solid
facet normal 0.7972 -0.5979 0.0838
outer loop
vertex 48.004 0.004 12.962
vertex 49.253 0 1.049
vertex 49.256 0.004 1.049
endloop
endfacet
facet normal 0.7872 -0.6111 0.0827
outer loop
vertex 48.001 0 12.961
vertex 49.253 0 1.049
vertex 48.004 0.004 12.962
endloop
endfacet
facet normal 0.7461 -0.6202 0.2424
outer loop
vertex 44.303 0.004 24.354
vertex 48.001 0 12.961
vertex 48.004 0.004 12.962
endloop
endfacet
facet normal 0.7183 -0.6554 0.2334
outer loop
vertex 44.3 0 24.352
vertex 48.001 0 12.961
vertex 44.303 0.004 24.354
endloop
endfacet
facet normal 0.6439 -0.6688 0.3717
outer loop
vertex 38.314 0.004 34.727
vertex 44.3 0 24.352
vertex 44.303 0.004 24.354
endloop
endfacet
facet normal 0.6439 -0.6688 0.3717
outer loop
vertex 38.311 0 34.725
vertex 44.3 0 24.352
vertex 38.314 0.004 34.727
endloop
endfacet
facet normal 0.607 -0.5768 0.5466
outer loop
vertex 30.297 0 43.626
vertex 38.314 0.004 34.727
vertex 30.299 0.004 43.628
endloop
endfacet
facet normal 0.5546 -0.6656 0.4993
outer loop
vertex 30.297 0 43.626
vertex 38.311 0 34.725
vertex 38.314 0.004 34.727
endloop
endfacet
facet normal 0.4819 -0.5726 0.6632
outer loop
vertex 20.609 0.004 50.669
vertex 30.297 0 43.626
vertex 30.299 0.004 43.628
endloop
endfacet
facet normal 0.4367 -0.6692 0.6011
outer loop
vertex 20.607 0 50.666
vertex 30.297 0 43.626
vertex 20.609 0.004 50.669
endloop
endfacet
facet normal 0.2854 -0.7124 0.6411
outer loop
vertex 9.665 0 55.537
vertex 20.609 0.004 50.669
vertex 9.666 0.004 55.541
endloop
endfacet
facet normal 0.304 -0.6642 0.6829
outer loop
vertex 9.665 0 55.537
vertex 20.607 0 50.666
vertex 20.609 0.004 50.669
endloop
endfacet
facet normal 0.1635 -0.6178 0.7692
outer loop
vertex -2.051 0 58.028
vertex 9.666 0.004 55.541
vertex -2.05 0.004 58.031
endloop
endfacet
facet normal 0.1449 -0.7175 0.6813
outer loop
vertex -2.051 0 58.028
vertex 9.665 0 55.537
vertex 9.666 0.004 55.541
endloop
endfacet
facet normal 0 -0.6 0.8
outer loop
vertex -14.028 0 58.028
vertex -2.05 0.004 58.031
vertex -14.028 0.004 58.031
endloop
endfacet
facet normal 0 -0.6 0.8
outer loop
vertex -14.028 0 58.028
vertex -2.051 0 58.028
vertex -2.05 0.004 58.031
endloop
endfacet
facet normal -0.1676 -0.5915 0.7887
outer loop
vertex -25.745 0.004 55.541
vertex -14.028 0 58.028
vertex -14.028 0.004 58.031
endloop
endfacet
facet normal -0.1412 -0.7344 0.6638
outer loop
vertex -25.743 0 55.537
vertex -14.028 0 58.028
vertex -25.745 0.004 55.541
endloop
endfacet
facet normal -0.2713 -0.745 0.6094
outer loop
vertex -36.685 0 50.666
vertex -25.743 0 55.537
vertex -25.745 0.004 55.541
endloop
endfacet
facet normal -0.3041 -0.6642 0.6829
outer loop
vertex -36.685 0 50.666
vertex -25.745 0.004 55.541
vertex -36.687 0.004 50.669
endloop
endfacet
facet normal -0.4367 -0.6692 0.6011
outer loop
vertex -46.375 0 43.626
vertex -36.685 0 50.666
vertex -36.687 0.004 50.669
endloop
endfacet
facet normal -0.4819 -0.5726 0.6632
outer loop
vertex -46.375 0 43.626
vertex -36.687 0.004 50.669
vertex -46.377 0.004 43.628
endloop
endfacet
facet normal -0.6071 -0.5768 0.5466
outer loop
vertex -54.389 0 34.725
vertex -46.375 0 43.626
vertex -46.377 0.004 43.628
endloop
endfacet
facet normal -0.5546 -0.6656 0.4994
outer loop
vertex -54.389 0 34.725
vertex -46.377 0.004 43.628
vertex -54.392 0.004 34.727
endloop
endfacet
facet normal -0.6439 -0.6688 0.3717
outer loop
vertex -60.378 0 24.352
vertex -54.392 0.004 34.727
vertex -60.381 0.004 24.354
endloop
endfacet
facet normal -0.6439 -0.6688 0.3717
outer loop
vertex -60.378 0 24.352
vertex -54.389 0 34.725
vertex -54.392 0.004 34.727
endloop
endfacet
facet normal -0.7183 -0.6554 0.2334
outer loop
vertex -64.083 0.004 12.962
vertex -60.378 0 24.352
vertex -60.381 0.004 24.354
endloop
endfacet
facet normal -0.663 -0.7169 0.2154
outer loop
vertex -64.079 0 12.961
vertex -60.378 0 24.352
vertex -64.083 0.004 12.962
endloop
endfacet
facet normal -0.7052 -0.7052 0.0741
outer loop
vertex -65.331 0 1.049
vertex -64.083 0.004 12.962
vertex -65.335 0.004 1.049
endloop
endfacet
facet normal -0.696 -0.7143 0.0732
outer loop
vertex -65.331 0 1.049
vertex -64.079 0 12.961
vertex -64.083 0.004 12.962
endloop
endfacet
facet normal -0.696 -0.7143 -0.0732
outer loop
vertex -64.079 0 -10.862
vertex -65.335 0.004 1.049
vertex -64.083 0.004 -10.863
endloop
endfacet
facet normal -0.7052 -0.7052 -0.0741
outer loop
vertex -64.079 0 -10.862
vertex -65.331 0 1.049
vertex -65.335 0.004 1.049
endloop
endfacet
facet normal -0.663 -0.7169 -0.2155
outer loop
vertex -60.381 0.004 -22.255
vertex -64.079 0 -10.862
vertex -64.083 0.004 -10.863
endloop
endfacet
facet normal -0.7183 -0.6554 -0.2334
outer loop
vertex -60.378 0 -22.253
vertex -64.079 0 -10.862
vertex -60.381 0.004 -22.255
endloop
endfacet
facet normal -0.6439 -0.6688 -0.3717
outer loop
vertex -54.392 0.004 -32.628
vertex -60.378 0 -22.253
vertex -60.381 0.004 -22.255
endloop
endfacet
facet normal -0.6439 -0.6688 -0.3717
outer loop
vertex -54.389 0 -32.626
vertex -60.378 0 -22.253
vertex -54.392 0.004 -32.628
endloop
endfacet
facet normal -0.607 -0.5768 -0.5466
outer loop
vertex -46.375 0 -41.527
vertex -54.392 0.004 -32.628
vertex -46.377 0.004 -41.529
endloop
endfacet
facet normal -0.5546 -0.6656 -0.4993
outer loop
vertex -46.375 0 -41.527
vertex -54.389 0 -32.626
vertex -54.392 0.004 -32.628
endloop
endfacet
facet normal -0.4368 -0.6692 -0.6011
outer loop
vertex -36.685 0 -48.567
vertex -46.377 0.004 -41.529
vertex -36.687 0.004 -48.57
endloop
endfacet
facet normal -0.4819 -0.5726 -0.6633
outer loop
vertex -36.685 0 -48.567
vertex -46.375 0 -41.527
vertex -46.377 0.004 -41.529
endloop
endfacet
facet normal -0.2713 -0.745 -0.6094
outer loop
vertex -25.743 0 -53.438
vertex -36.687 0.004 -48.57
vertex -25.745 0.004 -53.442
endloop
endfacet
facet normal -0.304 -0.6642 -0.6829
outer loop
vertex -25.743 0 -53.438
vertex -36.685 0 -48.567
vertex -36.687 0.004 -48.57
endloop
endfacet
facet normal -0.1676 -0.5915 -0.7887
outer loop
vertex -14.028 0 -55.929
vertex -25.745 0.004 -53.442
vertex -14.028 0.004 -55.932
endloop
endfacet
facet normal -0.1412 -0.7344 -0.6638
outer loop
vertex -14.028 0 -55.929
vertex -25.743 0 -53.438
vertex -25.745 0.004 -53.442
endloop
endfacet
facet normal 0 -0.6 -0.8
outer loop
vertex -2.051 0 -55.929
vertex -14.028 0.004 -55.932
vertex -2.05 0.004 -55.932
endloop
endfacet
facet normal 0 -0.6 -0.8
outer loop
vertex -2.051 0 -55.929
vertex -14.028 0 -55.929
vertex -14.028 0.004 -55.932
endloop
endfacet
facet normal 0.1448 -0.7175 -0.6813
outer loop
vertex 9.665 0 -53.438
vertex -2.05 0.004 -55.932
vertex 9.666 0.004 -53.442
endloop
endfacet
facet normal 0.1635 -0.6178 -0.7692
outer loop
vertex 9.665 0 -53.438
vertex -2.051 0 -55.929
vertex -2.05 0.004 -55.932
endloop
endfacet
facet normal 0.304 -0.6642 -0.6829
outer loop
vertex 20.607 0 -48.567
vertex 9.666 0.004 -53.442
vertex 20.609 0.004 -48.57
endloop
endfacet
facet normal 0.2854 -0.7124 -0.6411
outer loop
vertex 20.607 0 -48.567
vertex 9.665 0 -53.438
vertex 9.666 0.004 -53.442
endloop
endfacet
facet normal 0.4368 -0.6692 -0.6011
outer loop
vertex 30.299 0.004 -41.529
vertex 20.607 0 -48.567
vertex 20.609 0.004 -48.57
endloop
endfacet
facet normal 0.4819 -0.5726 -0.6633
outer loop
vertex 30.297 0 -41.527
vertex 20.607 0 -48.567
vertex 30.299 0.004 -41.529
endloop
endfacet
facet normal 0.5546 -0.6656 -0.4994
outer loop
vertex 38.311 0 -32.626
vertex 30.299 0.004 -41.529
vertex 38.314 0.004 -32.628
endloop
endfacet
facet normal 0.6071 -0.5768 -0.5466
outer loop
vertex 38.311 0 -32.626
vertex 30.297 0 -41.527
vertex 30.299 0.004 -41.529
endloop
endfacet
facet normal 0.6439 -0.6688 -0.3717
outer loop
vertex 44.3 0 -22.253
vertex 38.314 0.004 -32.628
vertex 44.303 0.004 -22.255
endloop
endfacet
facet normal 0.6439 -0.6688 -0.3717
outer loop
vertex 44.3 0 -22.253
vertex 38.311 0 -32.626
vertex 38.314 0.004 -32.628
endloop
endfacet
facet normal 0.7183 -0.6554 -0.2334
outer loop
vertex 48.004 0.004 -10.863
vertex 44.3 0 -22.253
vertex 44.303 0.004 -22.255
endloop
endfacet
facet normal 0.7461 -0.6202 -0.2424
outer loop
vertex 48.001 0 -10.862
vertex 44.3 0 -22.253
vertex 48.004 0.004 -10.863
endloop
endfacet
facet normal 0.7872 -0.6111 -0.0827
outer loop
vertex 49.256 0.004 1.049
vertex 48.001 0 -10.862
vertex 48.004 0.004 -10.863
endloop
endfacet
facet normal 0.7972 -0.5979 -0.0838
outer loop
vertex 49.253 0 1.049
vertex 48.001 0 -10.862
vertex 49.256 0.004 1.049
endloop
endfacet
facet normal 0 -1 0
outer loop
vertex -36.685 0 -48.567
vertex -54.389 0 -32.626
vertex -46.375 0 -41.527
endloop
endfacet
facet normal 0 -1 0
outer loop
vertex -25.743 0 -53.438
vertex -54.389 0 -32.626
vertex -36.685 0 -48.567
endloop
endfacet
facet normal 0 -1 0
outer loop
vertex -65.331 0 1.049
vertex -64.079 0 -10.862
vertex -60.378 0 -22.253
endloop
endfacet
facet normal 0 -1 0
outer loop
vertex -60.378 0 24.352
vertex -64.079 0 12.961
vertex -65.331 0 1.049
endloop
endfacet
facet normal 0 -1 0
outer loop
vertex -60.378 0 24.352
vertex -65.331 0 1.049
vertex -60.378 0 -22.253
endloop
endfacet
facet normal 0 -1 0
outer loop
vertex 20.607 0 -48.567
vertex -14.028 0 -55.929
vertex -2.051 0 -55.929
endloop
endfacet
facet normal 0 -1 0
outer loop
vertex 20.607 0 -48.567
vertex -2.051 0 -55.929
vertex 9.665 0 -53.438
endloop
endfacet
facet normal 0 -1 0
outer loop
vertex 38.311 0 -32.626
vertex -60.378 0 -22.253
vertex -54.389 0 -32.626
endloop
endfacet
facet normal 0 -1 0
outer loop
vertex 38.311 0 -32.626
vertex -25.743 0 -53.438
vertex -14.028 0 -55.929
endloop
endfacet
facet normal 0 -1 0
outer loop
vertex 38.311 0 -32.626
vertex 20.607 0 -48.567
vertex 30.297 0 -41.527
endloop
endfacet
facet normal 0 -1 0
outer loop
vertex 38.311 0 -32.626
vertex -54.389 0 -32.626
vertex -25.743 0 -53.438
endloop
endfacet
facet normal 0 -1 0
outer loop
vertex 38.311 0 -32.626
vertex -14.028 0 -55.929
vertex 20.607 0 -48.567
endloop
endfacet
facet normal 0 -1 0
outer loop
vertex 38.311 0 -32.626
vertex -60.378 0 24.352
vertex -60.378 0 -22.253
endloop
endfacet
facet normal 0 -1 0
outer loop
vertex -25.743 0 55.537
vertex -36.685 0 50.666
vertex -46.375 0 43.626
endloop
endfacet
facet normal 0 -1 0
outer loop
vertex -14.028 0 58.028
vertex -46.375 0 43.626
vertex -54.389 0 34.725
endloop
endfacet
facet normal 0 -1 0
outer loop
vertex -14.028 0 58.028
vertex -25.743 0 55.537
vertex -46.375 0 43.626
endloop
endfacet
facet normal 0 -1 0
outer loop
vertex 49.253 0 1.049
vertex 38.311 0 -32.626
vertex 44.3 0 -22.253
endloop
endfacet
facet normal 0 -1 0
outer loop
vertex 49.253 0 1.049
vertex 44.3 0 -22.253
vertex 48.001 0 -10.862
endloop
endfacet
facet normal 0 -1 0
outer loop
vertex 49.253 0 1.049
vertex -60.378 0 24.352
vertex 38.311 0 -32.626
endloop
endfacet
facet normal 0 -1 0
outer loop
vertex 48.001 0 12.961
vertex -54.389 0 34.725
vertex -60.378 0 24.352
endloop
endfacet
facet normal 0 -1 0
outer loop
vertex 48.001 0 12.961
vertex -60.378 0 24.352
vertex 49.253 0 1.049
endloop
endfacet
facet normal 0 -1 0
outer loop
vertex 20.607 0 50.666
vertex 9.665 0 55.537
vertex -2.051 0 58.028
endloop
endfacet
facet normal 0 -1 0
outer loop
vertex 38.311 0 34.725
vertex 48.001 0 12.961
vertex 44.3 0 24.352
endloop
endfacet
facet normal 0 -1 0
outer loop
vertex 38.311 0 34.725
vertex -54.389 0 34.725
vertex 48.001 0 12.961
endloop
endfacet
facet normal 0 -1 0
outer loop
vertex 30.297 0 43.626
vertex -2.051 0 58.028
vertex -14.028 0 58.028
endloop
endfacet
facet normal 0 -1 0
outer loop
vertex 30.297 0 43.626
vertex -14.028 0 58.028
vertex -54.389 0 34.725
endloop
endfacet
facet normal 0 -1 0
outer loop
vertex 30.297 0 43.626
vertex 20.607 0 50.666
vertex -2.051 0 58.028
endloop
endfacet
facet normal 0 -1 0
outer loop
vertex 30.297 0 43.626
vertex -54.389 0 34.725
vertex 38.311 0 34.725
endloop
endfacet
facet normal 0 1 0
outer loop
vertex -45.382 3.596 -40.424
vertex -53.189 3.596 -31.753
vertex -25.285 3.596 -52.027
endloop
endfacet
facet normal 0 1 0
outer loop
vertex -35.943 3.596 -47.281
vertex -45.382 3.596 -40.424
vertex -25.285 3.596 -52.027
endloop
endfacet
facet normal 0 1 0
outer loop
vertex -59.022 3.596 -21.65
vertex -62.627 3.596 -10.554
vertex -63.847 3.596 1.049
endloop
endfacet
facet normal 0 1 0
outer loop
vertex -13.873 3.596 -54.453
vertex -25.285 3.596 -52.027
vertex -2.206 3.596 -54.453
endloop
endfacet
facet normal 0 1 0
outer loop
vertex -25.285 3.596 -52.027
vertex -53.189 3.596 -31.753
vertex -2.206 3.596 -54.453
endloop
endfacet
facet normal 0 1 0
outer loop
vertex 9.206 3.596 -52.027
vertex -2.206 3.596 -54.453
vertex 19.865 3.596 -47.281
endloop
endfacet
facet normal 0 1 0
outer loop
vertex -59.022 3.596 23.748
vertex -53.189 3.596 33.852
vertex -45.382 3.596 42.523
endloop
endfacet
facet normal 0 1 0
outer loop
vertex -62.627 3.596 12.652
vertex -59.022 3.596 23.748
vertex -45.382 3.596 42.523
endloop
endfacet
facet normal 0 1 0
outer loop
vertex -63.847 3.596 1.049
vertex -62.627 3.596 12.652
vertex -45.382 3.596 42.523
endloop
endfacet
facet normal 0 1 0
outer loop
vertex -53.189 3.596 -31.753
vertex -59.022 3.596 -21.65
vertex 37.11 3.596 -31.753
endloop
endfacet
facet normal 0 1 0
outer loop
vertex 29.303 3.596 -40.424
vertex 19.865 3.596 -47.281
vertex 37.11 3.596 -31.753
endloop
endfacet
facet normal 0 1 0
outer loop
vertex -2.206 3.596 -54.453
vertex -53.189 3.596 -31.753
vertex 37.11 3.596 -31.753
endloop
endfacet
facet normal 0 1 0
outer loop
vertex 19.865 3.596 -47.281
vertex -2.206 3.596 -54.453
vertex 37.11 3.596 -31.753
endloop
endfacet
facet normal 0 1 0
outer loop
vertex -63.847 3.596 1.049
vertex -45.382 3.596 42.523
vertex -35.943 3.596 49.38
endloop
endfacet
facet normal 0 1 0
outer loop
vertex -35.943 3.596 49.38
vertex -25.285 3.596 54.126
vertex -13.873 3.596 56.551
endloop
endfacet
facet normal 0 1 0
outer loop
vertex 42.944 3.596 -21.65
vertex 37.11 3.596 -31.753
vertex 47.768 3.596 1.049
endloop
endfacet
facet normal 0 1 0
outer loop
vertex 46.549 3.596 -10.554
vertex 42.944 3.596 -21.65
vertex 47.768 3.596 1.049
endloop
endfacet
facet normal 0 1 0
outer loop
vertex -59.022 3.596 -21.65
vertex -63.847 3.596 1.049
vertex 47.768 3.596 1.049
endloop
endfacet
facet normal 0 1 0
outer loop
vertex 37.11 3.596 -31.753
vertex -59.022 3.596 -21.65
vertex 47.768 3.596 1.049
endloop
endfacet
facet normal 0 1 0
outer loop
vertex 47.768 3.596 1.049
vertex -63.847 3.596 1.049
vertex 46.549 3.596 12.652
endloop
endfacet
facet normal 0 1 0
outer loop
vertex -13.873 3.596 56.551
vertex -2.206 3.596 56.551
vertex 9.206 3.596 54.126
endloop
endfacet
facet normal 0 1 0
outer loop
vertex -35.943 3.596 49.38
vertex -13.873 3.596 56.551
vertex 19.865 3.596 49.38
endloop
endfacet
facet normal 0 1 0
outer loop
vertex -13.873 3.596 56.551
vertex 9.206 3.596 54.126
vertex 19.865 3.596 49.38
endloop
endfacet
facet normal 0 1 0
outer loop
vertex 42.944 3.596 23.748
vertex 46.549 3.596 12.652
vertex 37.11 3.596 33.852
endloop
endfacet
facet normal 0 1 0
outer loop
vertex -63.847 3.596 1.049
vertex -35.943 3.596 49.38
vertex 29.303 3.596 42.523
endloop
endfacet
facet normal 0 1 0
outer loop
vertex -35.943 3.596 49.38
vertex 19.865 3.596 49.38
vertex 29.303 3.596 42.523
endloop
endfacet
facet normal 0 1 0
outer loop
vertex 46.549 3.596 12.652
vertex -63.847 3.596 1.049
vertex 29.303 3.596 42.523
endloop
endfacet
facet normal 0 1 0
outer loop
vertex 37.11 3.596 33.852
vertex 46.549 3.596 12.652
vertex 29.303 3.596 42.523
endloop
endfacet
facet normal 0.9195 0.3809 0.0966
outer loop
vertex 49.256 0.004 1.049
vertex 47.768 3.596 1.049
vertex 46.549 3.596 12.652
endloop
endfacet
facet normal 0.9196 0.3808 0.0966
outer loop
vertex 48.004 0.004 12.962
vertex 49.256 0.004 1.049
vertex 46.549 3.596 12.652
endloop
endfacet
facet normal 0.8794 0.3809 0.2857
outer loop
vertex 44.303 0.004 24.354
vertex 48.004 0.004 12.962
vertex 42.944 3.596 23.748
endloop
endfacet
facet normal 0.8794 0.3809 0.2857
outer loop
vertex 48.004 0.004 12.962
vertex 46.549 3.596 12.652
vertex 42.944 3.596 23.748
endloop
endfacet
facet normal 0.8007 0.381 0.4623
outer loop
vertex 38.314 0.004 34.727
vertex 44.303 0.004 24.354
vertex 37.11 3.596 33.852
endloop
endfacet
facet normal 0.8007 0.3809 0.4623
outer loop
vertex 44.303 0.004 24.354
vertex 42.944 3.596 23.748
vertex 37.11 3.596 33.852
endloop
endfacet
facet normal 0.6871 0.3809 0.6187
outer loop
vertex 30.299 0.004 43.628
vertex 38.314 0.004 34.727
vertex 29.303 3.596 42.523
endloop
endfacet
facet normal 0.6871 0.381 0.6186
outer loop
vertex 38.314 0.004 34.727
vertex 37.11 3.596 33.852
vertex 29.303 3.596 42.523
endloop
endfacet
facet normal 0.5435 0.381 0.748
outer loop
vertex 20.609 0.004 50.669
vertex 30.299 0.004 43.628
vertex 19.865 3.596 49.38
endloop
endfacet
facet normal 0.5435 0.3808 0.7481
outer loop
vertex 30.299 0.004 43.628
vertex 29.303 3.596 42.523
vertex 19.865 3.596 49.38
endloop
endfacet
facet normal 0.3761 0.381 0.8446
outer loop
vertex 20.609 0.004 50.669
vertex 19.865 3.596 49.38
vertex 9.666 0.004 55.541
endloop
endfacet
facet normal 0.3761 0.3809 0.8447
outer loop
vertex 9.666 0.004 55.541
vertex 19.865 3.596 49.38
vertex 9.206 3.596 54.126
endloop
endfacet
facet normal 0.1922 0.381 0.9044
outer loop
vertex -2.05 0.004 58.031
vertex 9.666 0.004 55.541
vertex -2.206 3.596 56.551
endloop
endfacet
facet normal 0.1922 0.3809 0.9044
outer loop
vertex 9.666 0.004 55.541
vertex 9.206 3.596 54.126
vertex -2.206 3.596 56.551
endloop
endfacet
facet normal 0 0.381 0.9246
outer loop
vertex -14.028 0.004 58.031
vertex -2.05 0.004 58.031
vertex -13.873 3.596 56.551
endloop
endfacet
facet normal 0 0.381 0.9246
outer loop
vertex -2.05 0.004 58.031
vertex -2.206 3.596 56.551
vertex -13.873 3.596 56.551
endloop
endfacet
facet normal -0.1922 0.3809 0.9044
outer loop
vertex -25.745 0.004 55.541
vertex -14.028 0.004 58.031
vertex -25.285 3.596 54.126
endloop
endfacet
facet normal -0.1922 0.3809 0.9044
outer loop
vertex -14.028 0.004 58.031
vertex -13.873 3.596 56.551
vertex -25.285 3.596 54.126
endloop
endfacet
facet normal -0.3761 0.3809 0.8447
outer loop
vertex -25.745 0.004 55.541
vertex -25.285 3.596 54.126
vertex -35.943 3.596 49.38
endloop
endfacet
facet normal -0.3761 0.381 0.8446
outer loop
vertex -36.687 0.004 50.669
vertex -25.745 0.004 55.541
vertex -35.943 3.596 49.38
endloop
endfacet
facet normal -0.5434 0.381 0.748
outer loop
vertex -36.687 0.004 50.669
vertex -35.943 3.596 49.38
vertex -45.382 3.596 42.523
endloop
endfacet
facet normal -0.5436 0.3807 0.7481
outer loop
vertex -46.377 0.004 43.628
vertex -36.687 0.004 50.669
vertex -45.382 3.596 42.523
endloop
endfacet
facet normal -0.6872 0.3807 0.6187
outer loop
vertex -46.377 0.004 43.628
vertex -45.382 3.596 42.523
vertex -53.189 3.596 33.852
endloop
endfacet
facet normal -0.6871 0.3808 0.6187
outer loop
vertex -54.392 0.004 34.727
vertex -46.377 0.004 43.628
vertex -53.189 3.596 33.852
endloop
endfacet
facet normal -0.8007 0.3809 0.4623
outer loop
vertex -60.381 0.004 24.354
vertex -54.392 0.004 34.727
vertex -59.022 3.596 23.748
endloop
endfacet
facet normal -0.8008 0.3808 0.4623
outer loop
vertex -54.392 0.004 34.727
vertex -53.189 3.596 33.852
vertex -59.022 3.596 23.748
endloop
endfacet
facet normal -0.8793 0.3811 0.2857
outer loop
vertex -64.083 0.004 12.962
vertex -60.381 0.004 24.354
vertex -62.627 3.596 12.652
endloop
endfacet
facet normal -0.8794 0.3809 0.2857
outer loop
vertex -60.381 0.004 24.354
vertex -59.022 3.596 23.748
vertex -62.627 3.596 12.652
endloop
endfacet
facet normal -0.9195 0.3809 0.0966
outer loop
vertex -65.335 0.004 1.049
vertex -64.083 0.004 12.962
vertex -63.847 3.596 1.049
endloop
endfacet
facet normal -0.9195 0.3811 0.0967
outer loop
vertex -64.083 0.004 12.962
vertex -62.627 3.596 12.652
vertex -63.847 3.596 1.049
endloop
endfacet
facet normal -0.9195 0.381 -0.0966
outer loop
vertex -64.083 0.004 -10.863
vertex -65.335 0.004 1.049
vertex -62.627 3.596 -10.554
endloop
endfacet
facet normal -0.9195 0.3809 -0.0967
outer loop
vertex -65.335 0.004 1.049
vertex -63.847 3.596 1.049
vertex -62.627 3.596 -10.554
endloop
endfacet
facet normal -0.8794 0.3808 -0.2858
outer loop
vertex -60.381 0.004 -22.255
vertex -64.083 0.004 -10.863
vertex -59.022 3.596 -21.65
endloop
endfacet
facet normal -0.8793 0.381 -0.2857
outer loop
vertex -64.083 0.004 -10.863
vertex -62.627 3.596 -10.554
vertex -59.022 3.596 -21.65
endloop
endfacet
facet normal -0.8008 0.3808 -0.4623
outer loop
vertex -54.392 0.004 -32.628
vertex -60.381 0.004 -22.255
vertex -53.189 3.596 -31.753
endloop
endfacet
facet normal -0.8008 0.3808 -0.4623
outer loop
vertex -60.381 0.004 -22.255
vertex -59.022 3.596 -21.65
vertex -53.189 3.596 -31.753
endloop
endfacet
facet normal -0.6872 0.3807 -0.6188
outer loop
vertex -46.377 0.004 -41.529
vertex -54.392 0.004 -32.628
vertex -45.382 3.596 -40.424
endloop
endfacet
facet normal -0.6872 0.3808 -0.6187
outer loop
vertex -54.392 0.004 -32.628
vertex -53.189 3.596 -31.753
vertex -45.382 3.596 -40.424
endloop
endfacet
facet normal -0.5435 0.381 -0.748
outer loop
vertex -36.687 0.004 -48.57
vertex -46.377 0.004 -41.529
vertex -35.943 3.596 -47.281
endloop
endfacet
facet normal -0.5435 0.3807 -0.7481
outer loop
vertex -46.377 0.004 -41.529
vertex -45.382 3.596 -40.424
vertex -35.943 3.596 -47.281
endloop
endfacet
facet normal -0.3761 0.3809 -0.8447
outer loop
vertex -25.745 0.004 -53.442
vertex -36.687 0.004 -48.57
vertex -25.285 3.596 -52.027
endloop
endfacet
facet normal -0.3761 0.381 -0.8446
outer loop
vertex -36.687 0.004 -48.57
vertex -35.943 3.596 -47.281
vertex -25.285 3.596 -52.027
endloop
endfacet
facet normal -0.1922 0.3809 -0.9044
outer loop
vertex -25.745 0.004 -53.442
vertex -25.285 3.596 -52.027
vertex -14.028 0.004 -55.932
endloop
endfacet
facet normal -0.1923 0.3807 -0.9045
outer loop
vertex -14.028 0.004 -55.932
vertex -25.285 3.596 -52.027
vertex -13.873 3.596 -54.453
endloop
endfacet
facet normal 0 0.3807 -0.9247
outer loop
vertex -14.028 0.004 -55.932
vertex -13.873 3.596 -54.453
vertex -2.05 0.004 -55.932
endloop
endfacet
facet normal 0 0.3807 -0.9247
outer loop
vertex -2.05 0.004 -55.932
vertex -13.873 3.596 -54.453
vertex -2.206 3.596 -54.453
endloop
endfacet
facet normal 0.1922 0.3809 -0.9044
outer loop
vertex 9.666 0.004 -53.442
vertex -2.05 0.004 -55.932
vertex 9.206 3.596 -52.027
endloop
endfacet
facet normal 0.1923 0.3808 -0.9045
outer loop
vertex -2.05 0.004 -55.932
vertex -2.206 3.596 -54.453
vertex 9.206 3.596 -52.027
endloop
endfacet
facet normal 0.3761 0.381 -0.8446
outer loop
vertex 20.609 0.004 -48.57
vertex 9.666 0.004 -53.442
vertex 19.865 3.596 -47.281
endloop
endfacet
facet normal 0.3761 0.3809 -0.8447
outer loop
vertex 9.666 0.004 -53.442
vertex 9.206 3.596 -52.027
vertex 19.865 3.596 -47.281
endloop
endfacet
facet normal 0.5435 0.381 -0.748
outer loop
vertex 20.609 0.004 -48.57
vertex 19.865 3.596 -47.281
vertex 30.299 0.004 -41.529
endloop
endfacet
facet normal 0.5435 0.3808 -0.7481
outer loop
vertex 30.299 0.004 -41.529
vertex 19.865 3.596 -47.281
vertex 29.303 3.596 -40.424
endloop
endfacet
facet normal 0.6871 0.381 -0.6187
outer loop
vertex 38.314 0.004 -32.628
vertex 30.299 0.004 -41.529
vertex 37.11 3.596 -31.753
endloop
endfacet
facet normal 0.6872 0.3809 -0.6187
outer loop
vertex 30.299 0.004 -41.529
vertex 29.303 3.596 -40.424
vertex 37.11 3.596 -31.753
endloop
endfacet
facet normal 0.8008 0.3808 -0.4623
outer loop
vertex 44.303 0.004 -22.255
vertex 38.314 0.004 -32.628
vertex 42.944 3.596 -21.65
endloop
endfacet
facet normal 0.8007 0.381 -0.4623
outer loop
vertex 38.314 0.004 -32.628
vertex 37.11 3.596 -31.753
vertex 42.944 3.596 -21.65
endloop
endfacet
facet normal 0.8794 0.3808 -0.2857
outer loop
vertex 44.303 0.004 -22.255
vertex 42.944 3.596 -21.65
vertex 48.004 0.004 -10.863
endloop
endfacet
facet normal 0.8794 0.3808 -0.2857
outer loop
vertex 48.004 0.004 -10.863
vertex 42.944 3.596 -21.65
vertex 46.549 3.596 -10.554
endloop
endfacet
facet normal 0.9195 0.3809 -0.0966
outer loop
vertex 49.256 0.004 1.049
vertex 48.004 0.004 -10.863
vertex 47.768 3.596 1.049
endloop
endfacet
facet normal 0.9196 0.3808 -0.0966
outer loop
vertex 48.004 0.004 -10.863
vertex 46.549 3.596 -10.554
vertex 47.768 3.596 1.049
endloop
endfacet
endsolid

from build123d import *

# Parameters (mm, degrees)
F0_R     = 62.3719654877
F1_DEPTH = 3.5956986248
F3_SIZE  = 5.08


# Not quite as in the source:
# - a fillet or chamfer that OpenCascade refuses, or shapes differently, is made with other operations: its cross-section is extruded or revolved along the edge and cut away or added


with BuildPart() as f1:
    # F0 (on Front) → F1 (new body)
    with BuildSketch(Plane.XZ):
        with Locations((-8.0392340643, 1.049432549)):
            Circle(F0_R)
    extrude(amount=-F1_DEPTH)

    # F2: chamfer of 5.08 on 1 edges, made by hand

    # F2_s1 → F2_t2 (revolve, cut)
    with BuildSketch(Plane.XY.offset(1.049432549)):
        Polygon((54.3327314234, 5.08), (49.2527314234, 0), (54.3327314234, 0), align=None)
    revolve(axis=Axis((-8.0392340643, 0, 1.049432549), (0, -1, 0)), mode=Mode.SUBTRACT)

    # F3
    f3_edges = [f1.edges().sort_by_distance(p)[0] for p in [
        (-68.926898, 3.595699, 1.049433),
    ]]
    chamfer(f3_edges, length=F3_SIZE)


solid = f1.part
